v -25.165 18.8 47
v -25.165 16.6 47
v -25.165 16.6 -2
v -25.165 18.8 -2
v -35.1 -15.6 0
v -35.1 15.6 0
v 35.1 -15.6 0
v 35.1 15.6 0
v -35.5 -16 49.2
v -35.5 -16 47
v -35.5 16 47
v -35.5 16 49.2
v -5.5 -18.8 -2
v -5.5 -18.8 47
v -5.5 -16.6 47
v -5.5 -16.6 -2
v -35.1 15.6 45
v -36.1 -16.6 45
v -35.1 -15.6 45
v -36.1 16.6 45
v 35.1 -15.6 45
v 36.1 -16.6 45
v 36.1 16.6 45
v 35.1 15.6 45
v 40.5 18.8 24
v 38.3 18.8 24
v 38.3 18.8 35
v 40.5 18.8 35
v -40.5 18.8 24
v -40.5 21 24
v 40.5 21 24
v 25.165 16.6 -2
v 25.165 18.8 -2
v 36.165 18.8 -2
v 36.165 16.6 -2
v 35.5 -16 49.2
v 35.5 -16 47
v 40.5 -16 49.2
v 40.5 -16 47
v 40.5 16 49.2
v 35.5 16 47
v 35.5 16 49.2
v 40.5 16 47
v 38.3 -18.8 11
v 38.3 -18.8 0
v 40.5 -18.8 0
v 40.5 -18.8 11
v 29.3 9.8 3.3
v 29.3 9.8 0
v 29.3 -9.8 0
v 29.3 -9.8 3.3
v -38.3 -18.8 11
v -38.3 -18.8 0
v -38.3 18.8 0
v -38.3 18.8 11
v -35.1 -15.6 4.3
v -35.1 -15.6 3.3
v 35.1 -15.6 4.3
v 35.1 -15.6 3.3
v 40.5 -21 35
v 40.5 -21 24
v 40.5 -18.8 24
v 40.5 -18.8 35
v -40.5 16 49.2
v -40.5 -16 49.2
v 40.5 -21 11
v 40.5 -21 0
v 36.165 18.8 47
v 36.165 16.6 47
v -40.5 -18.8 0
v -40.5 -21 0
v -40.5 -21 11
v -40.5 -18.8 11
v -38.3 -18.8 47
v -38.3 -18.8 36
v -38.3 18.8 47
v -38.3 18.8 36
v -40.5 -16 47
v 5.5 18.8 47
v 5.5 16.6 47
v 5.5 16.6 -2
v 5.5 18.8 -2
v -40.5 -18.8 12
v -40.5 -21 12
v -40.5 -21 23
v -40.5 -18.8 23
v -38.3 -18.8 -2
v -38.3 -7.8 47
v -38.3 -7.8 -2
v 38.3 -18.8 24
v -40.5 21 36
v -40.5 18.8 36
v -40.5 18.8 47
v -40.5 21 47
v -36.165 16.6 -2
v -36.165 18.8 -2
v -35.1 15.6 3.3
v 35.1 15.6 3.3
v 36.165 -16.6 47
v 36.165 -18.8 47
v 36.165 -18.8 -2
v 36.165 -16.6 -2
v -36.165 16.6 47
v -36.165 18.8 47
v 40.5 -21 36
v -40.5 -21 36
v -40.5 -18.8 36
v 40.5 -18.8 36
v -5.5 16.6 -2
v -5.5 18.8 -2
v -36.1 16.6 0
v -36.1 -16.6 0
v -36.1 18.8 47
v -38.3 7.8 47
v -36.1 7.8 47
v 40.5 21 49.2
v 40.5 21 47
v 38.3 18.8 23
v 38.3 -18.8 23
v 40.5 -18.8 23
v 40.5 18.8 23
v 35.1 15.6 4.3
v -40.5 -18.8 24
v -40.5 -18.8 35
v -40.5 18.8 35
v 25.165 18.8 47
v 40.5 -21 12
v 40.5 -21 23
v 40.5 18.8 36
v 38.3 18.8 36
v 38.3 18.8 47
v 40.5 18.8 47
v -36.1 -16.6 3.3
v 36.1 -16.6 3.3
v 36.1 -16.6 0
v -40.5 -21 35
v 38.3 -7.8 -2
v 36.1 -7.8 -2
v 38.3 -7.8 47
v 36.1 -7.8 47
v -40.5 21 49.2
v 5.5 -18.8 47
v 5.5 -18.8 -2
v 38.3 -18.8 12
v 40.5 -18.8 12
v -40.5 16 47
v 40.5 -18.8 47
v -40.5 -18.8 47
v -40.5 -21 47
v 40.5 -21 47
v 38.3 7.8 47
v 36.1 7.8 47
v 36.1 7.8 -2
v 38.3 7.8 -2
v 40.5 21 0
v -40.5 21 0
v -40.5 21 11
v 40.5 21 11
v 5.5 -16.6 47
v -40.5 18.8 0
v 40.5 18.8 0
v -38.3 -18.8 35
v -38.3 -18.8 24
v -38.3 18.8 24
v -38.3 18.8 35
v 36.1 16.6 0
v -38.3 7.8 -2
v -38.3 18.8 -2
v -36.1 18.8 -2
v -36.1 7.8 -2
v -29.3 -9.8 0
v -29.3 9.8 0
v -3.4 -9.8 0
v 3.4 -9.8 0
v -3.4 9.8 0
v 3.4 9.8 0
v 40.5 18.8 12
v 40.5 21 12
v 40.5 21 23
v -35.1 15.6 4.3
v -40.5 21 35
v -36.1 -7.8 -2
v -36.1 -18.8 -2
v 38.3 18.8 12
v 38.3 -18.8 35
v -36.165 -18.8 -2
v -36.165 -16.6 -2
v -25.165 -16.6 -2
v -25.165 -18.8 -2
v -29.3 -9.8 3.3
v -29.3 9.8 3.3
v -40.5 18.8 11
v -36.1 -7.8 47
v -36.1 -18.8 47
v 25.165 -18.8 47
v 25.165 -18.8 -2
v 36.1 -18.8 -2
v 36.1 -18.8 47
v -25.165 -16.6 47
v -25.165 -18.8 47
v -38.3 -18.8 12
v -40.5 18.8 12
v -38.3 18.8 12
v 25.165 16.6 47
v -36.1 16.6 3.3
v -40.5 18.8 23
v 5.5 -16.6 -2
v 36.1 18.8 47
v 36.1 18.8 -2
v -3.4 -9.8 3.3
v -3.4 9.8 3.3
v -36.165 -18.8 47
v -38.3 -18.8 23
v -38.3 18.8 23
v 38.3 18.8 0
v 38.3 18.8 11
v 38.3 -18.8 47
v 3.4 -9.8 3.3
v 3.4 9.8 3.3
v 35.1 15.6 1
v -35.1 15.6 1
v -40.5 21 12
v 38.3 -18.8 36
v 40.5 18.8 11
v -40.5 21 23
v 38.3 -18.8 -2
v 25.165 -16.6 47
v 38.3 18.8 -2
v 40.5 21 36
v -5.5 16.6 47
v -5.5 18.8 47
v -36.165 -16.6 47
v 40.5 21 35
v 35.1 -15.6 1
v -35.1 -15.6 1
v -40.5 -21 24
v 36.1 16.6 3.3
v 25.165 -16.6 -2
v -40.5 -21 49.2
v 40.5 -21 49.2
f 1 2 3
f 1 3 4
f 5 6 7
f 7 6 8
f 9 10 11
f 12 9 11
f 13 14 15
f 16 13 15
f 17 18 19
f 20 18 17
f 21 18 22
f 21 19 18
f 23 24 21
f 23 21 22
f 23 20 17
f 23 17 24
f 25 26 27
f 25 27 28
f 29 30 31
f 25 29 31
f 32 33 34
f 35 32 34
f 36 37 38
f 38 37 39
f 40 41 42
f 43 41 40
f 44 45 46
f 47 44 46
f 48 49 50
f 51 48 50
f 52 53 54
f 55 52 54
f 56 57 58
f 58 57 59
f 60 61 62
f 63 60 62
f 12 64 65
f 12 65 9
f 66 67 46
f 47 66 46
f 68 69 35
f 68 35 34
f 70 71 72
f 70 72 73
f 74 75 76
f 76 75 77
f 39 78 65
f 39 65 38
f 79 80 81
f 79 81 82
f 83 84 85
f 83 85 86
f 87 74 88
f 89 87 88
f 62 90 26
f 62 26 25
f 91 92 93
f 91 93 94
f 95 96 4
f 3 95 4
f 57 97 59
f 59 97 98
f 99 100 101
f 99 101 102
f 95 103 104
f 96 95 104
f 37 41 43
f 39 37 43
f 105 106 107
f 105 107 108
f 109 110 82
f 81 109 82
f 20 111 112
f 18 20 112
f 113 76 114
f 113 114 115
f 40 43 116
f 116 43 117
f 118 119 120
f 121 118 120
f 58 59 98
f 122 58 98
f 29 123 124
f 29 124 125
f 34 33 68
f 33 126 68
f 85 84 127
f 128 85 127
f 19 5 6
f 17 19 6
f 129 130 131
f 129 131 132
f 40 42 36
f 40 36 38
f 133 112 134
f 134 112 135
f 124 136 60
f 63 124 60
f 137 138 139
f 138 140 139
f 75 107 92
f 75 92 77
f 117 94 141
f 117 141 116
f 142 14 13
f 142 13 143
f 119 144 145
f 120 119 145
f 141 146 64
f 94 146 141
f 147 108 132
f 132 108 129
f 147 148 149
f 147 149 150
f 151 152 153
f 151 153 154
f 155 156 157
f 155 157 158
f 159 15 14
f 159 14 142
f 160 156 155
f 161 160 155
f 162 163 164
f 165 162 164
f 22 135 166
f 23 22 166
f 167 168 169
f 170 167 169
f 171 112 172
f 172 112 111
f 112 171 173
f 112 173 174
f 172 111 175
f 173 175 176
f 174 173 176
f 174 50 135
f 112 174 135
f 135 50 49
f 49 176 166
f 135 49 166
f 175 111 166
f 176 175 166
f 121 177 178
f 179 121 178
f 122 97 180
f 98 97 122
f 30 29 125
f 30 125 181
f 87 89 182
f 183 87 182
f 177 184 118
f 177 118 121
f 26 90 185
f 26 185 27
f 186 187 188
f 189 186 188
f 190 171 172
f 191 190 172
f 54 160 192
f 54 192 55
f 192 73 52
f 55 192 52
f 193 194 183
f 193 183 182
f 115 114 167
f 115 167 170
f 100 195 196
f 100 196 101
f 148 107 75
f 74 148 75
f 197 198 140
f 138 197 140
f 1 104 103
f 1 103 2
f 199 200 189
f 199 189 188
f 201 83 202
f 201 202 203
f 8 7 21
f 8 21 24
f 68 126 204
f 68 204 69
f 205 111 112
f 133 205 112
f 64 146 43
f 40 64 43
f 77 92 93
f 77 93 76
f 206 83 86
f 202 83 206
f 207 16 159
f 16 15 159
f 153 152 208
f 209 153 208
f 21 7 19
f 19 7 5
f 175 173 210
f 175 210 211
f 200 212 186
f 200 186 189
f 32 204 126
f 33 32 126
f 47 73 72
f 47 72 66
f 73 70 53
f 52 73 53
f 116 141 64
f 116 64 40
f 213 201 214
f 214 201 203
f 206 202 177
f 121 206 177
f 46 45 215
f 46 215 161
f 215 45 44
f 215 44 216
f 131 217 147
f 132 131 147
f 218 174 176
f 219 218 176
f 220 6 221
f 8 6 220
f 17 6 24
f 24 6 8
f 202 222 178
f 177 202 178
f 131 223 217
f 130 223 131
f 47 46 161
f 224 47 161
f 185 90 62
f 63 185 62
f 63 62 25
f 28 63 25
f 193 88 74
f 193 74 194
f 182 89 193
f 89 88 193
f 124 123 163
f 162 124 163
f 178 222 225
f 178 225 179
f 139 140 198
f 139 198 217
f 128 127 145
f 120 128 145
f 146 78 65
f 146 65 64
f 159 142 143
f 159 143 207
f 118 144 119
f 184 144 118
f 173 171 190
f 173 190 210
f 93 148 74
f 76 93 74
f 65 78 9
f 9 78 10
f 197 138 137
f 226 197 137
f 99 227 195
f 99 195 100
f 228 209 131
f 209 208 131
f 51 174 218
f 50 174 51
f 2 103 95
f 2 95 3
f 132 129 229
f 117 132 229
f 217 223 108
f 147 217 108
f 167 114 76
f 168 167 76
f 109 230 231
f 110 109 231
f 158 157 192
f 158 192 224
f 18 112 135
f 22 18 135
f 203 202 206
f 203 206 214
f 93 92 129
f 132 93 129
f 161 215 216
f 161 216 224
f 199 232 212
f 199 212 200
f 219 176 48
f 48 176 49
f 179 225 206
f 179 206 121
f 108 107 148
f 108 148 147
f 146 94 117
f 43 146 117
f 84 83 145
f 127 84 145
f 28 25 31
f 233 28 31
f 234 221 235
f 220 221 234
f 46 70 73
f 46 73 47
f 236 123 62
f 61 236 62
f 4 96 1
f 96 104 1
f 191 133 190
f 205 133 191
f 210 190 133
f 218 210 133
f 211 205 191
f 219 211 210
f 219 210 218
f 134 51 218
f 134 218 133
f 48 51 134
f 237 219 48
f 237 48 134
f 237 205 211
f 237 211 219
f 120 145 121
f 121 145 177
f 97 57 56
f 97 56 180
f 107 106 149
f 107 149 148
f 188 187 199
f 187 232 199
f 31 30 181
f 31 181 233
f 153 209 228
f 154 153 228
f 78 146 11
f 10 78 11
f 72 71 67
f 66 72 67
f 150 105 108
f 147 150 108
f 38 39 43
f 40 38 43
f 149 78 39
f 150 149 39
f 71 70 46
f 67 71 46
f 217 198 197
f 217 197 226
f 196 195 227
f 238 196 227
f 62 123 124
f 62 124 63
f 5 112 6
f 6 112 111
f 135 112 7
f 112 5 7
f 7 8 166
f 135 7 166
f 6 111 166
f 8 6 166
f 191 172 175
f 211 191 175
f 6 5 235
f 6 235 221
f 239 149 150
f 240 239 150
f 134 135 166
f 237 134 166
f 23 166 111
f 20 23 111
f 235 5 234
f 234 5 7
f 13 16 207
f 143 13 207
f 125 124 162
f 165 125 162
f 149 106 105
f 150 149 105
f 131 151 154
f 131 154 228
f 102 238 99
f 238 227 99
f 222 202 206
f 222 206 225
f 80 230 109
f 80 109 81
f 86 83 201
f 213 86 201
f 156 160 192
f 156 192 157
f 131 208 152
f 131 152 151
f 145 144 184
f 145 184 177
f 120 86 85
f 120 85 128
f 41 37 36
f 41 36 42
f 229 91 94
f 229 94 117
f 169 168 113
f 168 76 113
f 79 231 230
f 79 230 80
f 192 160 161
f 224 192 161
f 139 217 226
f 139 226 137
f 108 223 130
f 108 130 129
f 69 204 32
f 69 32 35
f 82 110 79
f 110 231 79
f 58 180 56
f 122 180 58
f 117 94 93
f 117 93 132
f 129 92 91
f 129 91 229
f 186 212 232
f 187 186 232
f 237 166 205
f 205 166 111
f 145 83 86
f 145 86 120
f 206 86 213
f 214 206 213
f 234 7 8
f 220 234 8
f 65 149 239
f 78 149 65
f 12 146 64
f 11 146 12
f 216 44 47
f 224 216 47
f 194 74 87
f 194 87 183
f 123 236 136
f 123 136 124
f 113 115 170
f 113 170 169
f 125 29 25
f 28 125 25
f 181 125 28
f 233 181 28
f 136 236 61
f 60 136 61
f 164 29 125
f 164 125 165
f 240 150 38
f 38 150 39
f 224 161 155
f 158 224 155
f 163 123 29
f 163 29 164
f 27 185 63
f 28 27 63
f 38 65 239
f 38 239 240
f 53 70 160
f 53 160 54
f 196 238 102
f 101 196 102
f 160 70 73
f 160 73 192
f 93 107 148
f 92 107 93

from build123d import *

# Parameters (mm, degrees)
F2_W           = 2.2
F2_H           = 37.6
F3_DEPTH       = 47
F1_W           = 81
F1_H           = 2.2
F4_W           = 114.100013802
F4_H           = 1
F4_W_2         = 121.7789687216
F4_W_3         = 120.9573857486
F5_DEPTH       = 30
F6_W           = 2.2
F6_H           = 11
F7_DEPTH       = 47
F7_DEPTH_BACK  = 2
F8_W           = 11
F8_H           = 2.2
F9_DEPTH       = 47
F9_DEPTH_BACK  = 2
F10_W          = 58.6
F10_H          = 6.8
F11_DEPTH      = 3.3
F12_W          = 6.8
F12_H          = 19.6
F13_DEPTH      = 3.3
F14_W          = 1
F14_H          = 31.2
F15_DEPTH      = 45
F16_W          = 70.2
F16_H          = 31.2
F17_DEPTH      = 1
F18_W          = 81
F18_H          = 5
F19_DEPTH      = 2.2
F20_W          = 5
F20_H          = 32
F21_DEPTH      = 2.2
F22_W          = 70.2
F22_H          = 31.2
F23_DEPTH      = 1
F24_W          = 11
F24_H          = 2.2
F25_DEPTH      = 47
F25_DEPTH_BACK = 2


with BuildPart() as f3:
    # F2 (on Top) → F3 (new body)
    with BuildSketch(Plane.XY):
        with Locations((-39.4, 0)):
            Rectangle(F2_W, F2_H)
    extrude(amount=F3_DEPTH)


with BuildPart() as f3b:
    # F2 (on Top) → F3, piece 2 (new body)
    with BuildSketch(Plane.XY):
        with Locations((39.4, 0)):
            Rectangle(F2_W, F2_H)
    extrude(amount=F3_DEPTH)


with BuildPart() as f3c:
    # F1 (on Top) → F3, piece 3 (new body)
    with BuildSketch(Plane.XY):
        with Locations((0, 19.9)):
            Rectangle(F1_W, F1_H)
    extrude(amount=F3_DEPTH)


with BuildPart() as f3d:
    # F1 (on Top) → F3, piece 4 (new body)
    with BuildSketch(Plane.XY):
        with Locations((0, -19.9)):
            Rectangle(F1_W, F1_H)
    extrude(amount=F3_DEPTH)


with BuildPart() as f5_tool:
    # F4 (on Front) → F5 (new body, symmetric)
    with BuildSketch(Plane.XZ):
        with Locations((2.0889788866, 11.5)):
            Rectangle(F4_W, F4_H)
        with Locations((0.0301543623, 23.5)):
            Rectangle(F4_W_2, F4_H)
        with Locations((-1.0184142739, 35.5)):
            Rectangle(F4_W_3, F4_H)
    extrude(amount=F5_DEPTH, both=True)


with BuildPart() as f3_1:
    add(f3.part)

    # F5: cut by f5_tool
    add(f5_tool.part, mode=Mode.SUBTRACT)


with BuildPart() as f3b_1:
    add(f3b.part)

    # F5: cut by f5_tool
    add(f5_tool.part, mode=Mode.SUBTRACT)


with BuildPart() as f3c_1:
    add(f3c.part)

    # F5: cut by f5_tool
    add(f5_tool.part, mode=Mode.SUBTRACT)


with BuildPart() as f3d_1:
    add(f3d.part)

    # F5: cut by f5_tool
    add(f5_tool.part, mode=Mode.SUBTRACT)


with BuildPart() as f7:
    # F6 (on Top) → F7 (new body, two sides)
    with BuildSketch(Plane.XY) as f7_sk:
        with Locations((-37.2, 13.3)):
            Rectangle(F6_W, F6_H)
    extrude(amount=F7_DEPTH)
    extrude(f7_sk.sketch, amount=-F7_DEPTH_BACK)


with BuildPart() as f7b:
    # F6 (on Top) → F7, piece 2 (new body, two sides)
    with BuildSketch(Plane.XY) as f7_2_sk:
        with Locations((-37.2, -13.3)):
            Rectangle(F6_W, F6_H)
    extrude(amount=F7_DEPTH)
    extrude(f7_2_sk.sketch, amount=-F7_DEPTH_BACK)


with BuildPart() as f7c:
    # F6 (on Top) → F7, piece 3 (new body, two sides)
    with BuildSketch(Plane.XY) as f7_3_sk:
        with Locations((37.2, 13.3)):
            Rectangle(F6_W, F6_H)
    extrude(amount=F7_DEPTH)
    extrude(f7_3_sk.sketch, amount=-F7_DEPTH_BACK)


with BuildPart() as f7d:
    # F6 (on Top) → F7, piece 4 (new body, two sides)
    with BuildSketch(Plane.XY) as f7_4_sk:
        with Locations((37.2, -13.3)):
            Rectangle(F6_W, F6_H)
    extrude(amount=F7_DEPTH)
    extrude(f7_4_sk.sketch, amount=-F7_DEPTH_BACK)


with BuildPart() as f9:
    # F8 (on Top) → F9 (new body, two sides)
    with BuildSketch(Plane.XY) as f9_sk:
        with Locations((-30.6646097228, 17.7)):
            Rectangle(F8_W, F8_H)
    extrude(amount=F9_DEPTH)
    extrude(f9_sk.sketch, amount=-F9_DEPTH_BACK)


with BuildPart() as f9b:
    # F8 (on Top) → F9, piece 2 (new body, two sides)
    with BuildSketch(Plane.XY) as f9_2_sk:
        with Locations((-30.6646097228, -17.7)):
            Rectangle(F8_W, F8_H)
    extrude(amount=F9_DEPTH)
    extrude(f9_2_sk.sketch, amount=-F9_DEPTH_BACK)


with BuildPart() as f9c:
    # F8 (on Top) → F9, piece 3 (new body, two sides)
    with BuildSketch(Plane.XY) as f9_3_sk:
        with Locations((30.6646097228, 17.7)):
            Rectangle(F8_W, F8_H)
    extrude(amount=F9_DEPTH)
    extrude(f9_3_sk.sketch, amount=-F9_DEPTH_BACK)


with BuildPart() as f9d:
    # F8 (on Top) → F9, piece 4 (new body, two sides)
    with BuildSketch(Plane.XY) as f9_4_sk:
        with Locations((30.6646097228, -17.7)):
            Rectangle(F8_W, F8_H)
    extrude(amount=F9_DEPTH)
    extrude(f9_4_sk.sketch, amount=-F9_DEPTH_BACK)


with BuildPart() as f11:
    # F10 (on Top) → F11 (new body)
    with BuildSketch(Plane.XY):
        Polygon((-29.3, 16.6), (-36.1, 16.6), (-36.1, -16.6), (-29.3, -16.6), (-29.3, -9.8), (-29.3, 9.8), align=None)
        with Locations((0, 13.2)):
            Rectangle(F10_W, F10_H)
        Polygon((36.1, 16.6), (29.3, 16.6), (29.3, 9.8), (29.3, -9.8), (29.3, -16.6), (36.1, -16.6), align=None)
        with Locations((0, -13.2)):
            Rectangle(F10_W, F10_H)
    extrude(amount=F11_DEPTH)

    # F12 (on Top) → F13 (join)
    with BuildSketch(Plane.XY):
        Rectangle(F12_W, F12_H)
    extrude(amount=F13_DEPTH)


with BuildPart() as f15:
    # F14 (on Top) → F15 (new body)
    with BuildSketch(Plane.XY):
        Polygon((36.1, 16.6), (-36.1, 16.6), (-36.1, 15.6), (-35.1, 15.6), (35.1, 15.6), (36.1, 15.6), align=None)
        with Locations((-35.6, 0)):
            Rectangle(F14_W, F14_H)
        with Locations((35.6, 0)):
            Rectangle(F14_W, F14_H)
        Polygon((-35.1, -15.6), (-36.1, -15.6), (-36.1, -16.6), (36.1, -16.6), (36.1, -15.6), (35.1, -15.6), align=None)
    extrude(amount=F15_DEPTH)


with BuildPart() as f17:
    # F16 (on Top) → F17 (new body)
    with BuildSketch(Plane.XY):
        Rectangle(F16_W, F16_H)
    extrude(amount=F17_DEPTH)


with BuildPart() as f19:
    # F18 (on face) → F19 (new body)
    with BuildSketch(Plane.XY.offset(47)):
        with Locations((0, 18.5)):
            Rectangle(F18_W, F18_H)
    extrude(amount=F19_DEPTH)


with BuildPart() as f19b:
    # F18 (on face) → F19, piece 2 (new body)
    with BuildSketch(Plane.XY.offset(47)):
        with Locations((0, -18.5)):
            Rectangle(F18_W, F18_H)
    extrude(amount=F19_DEPTH)


with BuildPart() as f21:
    # F20 (on face) → F21 (new body)
    with BuildSketch(Plane.XY.offset(47)):
        with Locations((-38, 0)):
            Rectangle(F20_W, F20_H)
    extrude(amount=F21_DEPTH)


with BuildPart() as f21b:
    # F20 (on face) → F21, piece 2 (new body)
    with BuildSketch(Plane.XY.offset(47)):
        with Locations((38, 0)):
            Rectangle(F20_W, F20_H)
    extrude(amount=F21_DEPTH)


with BuildPart() as f23:
    # F22 (on face) → F23 (new body)
    with BuildSketch(Plane.XY.offset(3.3)):
        Rectangle(F22_W, F22_H)
    extrude(amount=F23_DEPTH)


with BuildPart() as f25:
    # F24 (on Top) → F25 (new body, two sides)
    with BuildSketch(Plane.XY) as f25_sk:
        with Locations((0, 17.7)):
            Rectangle(F24_W, F24_H)
    extrude(amount=F25_DEPTH)
    extrude(f25_sk.sketch, amount=-F25_DEPTH_BACK)


with BuildPart() as f25b:
    # F24 (on Top) → F25, piece 2 (new body, two sides)
    with BuildSketch(Plane.XY) as f25_2_sk:
        with Locations((0, -17.7)):
            Rectangle(F24_W, F24_H)
    extrude(amount=F25_DEPTH)
    extrude(f25_2_sk.sketch, amount=-F25_DEPTH_BACK)


solid = Compound([f3_1.part, f3b_1.part, f3c_1.part, f3d_1.part, f7.part, f7b.part, f7c.part, f7d.part, f9.part, f9b.part, f9c.part, f9d.part, f11.part, f15.part, f17.part, f19.part, f19b.part, f21.part, f21b.part, f23.part, f25.part, f25b.part])
